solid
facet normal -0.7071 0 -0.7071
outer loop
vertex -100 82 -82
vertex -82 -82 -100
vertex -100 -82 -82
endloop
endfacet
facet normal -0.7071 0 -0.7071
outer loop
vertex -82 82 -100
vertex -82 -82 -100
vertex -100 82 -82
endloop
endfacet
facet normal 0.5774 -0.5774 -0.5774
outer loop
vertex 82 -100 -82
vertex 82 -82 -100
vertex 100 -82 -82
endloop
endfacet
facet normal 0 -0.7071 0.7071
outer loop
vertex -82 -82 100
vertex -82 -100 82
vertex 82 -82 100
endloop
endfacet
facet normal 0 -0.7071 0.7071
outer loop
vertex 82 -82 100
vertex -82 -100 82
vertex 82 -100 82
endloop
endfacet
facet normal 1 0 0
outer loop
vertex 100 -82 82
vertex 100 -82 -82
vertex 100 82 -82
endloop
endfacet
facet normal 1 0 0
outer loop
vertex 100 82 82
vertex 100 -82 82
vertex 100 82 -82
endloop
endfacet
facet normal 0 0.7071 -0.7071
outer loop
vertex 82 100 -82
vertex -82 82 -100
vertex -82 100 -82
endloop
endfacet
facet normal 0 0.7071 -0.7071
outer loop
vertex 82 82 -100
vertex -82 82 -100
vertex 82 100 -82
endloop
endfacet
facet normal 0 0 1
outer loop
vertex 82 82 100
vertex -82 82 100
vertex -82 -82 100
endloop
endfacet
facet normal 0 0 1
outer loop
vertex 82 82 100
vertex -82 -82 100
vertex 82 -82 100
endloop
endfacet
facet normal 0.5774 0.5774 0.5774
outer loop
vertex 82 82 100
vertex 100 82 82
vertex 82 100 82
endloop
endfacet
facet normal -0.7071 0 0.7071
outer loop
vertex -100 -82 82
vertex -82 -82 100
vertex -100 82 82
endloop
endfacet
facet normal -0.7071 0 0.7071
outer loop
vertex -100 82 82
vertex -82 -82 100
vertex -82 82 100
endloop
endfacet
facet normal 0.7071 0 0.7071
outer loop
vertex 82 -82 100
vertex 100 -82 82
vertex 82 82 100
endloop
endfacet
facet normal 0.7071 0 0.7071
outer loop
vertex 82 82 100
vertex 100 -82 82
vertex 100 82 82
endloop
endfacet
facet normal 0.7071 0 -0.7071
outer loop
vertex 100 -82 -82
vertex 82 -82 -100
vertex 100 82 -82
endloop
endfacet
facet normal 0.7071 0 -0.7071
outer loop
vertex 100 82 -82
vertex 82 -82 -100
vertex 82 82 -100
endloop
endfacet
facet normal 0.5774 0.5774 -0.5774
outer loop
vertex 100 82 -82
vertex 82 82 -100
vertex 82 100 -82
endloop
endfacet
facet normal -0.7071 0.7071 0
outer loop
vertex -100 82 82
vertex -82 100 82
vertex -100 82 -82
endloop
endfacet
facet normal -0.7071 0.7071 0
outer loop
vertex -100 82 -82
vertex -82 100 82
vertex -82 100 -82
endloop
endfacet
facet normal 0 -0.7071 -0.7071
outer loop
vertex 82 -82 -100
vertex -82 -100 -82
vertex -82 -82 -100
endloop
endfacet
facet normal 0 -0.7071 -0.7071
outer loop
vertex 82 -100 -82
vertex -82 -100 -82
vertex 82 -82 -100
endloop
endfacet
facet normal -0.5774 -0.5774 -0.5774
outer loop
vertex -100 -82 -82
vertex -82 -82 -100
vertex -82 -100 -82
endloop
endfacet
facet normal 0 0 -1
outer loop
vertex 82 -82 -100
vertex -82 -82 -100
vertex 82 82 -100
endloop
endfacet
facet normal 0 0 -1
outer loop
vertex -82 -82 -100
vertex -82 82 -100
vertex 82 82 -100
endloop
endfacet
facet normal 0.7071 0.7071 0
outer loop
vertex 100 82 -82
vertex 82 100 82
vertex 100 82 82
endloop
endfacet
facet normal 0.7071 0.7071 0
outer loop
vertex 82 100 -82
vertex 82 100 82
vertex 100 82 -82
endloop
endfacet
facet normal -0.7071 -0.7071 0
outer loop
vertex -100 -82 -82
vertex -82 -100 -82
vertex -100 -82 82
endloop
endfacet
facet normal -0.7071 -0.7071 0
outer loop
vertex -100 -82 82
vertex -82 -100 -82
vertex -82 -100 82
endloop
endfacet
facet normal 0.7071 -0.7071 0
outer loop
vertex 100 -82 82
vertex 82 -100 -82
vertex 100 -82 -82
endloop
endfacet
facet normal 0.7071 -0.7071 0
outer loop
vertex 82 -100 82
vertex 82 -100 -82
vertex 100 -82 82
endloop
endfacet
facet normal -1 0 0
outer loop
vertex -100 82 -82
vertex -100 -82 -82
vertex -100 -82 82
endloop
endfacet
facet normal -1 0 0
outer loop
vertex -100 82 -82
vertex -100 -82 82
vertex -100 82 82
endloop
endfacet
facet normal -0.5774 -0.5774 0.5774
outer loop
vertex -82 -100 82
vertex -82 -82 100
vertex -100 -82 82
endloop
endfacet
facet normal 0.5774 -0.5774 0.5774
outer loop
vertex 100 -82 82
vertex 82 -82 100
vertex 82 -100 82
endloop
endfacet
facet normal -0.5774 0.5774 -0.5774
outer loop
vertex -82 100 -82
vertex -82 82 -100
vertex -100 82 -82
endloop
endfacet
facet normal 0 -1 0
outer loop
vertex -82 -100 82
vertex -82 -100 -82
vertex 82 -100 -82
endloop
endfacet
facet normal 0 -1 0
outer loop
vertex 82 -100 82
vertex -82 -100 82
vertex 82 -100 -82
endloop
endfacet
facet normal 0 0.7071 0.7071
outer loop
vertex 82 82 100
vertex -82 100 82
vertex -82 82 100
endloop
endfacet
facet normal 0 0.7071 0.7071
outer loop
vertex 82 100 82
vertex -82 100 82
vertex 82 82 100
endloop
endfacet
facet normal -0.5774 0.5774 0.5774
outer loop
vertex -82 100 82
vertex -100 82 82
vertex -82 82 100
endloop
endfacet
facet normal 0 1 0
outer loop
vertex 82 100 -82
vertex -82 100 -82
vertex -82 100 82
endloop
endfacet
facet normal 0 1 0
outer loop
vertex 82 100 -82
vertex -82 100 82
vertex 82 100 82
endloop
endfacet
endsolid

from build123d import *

# Parameters (mm, degrees)
SKETCH_1_W      = 200
SKETCH_1_H      = 200
EXTRUDE_1_DEPTH = 100
CHAMFER_1_SIZE  = 18


with BuildPart() as part:
    # 草图1 → 凸台-拉伸1 (new, symmetric)
    with BuildSketch(Plane.XY):
        Rectangle(SKETCH_1_W, SKETCH_1_H)
    extrude(amount=EXTRUDE_1_DEPTH, both=True)

    # 倒角1
    chamfer_1_edges = [part.edges().sort_by_distance(p)[0] for p in [
        (-100, 0, 100),
        (0, -100, 100),
        (100, 0, 100),
        (0, -100, -100),
        (-100, 0, -100),
        (0, 100, -100),
        (100, 0, -100),
        (100, -100, 0),
        (-100, -100, 0),
        (-100, 100, 0),
        (100, 100, 0),
        (0, 100, 100),
    ]]
    chamfer(chamfer_1_edges, length=CHAMFER_1_SIZE)


solid = part.part
